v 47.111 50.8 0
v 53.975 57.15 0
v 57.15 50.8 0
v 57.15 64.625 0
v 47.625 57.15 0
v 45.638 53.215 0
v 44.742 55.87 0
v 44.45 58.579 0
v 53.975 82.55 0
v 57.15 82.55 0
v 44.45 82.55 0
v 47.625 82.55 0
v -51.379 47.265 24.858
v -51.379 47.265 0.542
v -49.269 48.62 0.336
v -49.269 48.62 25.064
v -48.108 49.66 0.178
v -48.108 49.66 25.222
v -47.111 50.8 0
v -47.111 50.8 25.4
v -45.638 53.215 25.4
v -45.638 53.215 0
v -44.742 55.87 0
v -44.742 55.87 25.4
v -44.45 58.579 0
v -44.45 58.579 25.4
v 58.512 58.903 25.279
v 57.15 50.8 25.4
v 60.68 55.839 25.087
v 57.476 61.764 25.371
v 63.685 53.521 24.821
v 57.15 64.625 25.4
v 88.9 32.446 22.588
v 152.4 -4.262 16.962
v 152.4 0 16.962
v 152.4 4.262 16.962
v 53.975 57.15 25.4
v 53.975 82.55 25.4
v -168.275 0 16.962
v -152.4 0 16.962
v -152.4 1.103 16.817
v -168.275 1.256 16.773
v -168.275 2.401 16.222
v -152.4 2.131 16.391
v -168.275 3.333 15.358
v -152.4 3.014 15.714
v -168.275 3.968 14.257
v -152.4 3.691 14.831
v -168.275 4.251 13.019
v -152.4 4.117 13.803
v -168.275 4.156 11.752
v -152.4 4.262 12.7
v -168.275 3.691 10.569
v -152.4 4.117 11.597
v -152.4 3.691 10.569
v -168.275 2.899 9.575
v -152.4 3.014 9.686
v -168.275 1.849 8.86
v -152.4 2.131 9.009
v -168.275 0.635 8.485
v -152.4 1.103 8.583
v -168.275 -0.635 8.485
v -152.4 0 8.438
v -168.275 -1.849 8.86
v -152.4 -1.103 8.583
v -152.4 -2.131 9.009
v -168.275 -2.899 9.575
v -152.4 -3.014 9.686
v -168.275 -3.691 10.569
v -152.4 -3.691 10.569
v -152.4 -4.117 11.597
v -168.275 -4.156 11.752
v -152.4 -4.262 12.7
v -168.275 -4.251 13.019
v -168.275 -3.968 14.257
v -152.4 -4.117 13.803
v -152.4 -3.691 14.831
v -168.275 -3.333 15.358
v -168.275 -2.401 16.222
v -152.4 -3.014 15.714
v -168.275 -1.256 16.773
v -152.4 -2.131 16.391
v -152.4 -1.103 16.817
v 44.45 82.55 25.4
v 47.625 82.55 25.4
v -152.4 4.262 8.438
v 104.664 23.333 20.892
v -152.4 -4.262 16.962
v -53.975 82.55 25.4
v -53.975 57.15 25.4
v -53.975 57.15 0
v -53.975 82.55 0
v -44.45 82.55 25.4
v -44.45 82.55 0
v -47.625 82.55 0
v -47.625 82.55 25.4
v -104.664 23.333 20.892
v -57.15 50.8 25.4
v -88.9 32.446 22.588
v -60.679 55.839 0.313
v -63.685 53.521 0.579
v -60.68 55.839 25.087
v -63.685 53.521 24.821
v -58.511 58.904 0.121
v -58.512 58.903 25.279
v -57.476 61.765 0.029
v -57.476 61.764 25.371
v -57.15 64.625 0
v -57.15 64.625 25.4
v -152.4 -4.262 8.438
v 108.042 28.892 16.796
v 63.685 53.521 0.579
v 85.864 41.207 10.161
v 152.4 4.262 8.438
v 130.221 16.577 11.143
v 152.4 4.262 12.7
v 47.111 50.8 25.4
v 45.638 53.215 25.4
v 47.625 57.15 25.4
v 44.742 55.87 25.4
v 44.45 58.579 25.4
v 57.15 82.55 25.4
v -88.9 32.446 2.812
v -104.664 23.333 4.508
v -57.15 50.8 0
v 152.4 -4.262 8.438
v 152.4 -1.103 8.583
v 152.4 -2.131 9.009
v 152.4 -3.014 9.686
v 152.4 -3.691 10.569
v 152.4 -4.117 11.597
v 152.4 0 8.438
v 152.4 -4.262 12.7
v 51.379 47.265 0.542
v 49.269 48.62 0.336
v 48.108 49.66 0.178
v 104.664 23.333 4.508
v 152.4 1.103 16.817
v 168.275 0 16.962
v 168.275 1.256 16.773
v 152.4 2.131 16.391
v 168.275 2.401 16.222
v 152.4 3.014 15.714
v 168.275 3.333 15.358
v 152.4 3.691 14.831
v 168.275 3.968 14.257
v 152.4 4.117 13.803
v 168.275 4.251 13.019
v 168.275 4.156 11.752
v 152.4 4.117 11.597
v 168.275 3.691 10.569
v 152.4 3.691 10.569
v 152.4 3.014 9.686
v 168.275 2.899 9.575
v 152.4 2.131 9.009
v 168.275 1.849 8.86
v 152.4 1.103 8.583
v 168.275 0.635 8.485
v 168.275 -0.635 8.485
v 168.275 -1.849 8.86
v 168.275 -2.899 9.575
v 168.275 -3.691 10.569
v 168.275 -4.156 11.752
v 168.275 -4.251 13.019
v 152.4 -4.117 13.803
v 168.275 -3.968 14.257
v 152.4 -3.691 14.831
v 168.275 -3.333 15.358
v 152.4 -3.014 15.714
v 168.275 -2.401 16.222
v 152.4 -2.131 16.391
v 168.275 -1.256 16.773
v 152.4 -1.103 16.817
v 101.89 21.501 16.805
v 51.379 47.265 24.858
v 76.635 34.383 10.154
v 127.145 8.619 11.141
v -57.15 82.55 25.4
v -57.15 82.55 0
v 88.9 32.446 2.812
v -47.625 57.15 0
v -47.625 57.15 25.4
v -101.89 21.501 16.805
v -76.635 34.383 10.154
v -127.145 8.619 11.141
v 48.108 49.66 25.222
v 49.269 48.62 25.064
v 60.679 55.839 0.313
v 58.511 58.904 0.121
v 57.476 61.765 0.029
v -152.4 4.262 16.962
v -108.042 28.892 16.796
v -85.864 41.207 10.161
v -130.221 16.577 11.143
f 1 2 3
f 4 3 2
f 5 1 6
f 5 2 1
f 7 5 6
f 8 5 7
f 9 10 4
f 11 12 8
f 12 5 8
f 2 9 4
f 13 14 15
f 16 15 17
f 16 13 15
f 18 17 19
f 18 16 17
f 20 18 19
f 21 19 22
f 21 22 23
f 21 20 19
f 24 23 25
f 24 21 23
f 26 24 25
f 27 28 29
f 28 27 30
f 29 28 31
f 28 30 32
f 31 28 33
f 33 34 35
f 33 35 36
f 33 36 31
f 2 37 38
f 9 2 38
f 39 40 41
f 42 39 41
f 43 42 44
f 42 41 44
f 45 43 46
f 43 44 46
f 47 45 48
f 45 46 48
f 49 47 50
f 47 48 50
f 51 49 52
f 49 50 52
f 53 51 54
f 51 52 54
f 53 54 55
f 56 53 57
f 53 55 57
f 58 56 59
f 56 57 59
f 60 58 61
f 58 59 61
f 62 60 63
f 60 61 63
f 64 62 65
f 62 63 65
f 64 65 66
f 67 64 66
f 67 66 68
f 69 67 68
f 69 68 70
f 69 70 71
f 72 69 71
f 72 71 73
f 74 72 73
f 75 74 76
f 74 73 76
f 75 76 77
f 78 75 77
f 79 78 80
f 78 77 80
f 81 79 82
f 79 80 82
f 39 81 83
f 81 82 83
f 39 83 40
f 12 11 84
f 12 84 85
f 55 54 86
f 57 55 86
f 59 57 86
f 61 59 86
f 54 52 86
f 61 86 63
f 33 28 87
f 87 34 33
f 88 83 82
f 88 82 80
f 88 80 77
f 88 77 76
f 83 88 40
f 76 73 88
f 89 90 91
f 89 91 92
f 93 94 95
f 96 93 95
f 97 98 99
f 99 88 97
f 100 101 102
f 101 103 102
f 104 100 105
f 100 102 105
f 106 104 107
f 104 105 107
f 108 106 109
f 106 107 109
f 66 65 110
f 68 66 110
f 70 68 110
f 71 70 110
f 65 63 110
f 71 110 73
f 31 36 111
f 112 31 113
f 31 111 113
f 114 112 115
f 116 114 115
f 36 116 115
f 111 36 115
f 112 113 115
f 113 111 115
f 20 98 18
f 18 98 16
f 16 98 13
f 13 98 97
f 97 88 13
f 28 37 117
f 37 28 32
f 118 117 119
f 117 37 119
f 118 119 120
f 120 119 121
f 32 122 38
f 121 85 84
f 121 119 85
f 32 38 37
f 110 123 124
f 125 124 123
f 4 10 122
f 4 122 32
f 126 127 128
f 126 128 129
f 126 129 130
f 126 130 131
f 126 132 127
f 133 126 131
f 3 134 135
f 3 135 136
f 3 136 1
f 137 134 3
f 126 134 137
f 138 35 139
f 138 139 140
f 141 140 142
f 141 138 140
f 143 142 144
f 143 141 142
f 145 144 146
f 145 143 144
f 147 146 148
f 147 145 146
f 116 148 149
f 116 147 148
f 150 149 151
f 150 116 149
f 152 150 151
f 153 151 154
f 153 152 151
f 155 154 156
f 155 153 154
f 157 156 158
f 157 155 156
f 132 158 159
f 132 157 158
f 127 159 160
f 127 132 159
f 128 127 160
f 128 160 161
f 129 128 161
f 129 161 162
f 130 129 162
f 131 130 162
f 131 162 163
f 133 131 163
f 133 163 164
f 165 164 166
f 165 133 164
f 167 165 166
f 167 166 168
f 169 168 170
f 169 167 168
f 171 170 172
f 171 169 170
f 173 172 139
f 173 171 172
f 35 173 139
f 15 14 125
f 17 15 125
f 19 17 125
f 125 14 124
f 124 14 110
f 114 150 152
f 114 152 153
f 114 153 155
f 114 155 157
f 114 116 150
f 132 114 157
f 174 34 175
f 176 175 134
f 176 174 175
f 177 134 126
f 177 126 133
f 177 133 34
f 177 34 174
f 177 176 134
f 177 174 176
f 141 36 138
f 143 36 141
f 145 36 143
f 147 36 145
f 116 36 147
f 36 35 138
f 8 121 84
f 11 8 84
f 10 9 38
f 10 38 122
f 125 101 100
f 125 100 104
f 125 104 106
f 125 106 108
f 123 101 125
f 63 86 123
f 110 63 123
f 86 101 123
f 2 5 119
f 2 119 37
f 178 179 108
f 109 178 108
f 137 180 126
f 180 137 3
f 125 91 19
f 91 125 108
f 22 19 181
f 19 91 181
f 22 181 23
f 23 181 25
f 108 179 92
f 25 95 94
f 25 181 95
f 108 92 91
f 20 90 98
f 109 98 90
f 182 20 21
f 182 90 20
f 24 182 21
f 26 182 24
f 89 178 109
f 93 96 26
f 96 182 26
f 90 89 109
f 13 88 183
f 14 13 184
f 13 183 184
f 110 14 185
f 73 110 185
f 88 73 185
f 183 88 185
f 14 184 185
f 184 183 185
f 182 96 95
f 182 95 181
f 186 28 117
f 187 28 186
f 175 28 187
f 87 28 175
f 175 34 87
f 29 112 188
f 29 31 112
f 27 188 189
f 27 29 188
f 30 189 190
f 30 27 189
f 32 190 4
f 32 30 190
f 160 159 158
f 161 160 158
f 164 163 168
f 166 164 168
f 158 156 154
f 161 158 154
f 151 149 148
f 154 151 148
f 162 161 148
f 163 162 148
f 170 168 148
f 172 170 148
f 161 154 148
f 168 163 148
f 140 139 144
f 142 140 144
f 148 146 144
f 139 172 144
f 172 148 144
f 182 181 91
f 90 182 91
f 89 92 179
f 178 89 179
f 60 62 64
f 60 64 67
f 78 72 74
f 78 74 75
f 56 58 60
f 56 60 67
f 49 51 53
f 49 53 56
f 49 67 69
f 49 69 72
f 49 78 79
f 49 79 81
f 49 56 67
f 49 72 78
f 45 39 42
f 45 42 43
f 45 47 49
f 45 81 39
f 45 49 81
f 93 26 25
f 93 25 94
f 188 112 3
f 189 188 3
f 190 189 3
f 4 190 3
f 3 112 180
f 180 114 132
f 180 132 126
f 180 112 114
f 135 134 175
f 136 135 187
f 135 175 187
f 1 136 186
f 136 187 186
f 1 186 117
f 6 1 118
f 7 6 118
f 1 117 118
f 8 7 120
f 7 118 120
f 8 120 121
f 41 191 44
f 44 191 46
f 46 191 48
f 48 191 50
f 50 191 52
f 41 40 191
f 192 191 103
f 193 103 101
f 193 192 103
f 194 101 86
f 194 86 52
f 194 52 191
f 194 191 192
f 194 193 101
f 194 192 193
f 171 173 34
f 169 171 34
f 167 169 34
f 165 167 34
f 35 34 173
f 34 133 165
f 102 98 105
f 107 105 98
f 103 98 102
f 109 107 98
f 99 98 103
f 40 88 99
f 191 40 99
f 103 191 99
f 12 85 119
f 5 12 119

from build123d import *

# Parameters (mm, degrees)
BOSS_EXTRUDE1_DEPTH = 25.4
FILLET2_R           = 12.7
FILLET3_R           = 12.7
SKETCH7_R           = 4.2625
BOSS_EXTRUDE3_DEPTH = 15.875


with BuildPart() as part:
    # Sketch3 → Boss-Extrude1 (new body)
    with BuildSketch(Plane.XY):
        Polygon((-44.45, 50.8), (-44.45, 82.55), (-47.625, 82.55), (-47.625, 57.15), (-53.975, 57.15), (-53.975, 82.55), (-57.15, 82.55), (-57.15, 50.8), align=None)
    extrude(amount=BOSS_EXTRUDE1_DEPTH)

    # Sketch5 → section 1 of loft1
    with BuildSketch(Plane(origin=(-152.4, 0, 0), x_dir=(0, 0, -1), z_dir=(1, 0, 0)), mode=Mode.PRIVATE) as loft1_s1:
        with BuildLine():
            Line((-16.9625, 4.2625), (-8.4375, 4.2625))
            Line((-8.4375, 4.2625), (-8.4375, -4.2625))
            Line((-8.4375, -4.2625), (-16.9625, -4.2625))
            Line((-16.9625, -4.2625), (-16.9625, 4.2625))
        make_face()
    # loft from a face of the part (loft1)
    loft([part.faces().sort_by_distance((-50.8, 50.8, 12.7))[0], loft1_s1.sketch])

    # Sketch6 → Loft2 section 0
    with BuildSketch(Plane.ZY.offset(57.15)):
        with BuildLine():
            Line((0, 50.8), (25.4, 50.8))
            Line((25.4, 50.8), (25.4, 57.15))
            Line((25.4, 57.15), (0, 57.15))
            Line((0, 57.15), (0, 50.8))
        make_face()
    # Sketch5<2> → Loft2 section 1
    with BuildSketch(Plane(origin=(-152.4, 0, 0), x_dir=(0, 0, -1), z_dir=(1, 0, 0))):
        with BuildLine():
            Line((-16.9625, 4.2625), (-8.4375, 4.2625))
            Line((-8.4375, 4.2625), (-8.4375, -4.2625))
            Line((-8.4375, -4.2625), (-16.9625, -4.2625))
            Line((-16.9625, -4.2625), (-16.9625, 4.2625))
        make_face()
    loft()

    # Fillet2
    fillet2_edges = [part.edges().sort_by_distance(p)[0] for p in [
        (-57.15, 57.15, 12.7),
    ]]
    fillet(fillet2_edges, radius=FILLET2_R)

    # Fillet3
    fillet3_edges = [part.edges().sort_by_distance(p)[0] for p in [
        (-44.45, 50.8, 12.7),
    ]]
    fillet(fillet3_edges, radius=FILLET3_R)

    # Sketch7 → Boss-Extrude3 (add)
    with BuildSketch(Plane.ZY.offset(152.4)):
        with Locations((12.7, 0)):
            Circle(SKETCH7_R)
    extrude(amount=BOSS_EXTRUDE3_DEPTH)


with BuildPart() as body_2:
    # Mirror2: mirrored copy
    add(part.part.mirror(Plane(origin=(0, 0, 0), x_dir=(0, 0, 1), z_dir=(1, 0, 0))))


solid = Compound([part.part, body_2.part])
